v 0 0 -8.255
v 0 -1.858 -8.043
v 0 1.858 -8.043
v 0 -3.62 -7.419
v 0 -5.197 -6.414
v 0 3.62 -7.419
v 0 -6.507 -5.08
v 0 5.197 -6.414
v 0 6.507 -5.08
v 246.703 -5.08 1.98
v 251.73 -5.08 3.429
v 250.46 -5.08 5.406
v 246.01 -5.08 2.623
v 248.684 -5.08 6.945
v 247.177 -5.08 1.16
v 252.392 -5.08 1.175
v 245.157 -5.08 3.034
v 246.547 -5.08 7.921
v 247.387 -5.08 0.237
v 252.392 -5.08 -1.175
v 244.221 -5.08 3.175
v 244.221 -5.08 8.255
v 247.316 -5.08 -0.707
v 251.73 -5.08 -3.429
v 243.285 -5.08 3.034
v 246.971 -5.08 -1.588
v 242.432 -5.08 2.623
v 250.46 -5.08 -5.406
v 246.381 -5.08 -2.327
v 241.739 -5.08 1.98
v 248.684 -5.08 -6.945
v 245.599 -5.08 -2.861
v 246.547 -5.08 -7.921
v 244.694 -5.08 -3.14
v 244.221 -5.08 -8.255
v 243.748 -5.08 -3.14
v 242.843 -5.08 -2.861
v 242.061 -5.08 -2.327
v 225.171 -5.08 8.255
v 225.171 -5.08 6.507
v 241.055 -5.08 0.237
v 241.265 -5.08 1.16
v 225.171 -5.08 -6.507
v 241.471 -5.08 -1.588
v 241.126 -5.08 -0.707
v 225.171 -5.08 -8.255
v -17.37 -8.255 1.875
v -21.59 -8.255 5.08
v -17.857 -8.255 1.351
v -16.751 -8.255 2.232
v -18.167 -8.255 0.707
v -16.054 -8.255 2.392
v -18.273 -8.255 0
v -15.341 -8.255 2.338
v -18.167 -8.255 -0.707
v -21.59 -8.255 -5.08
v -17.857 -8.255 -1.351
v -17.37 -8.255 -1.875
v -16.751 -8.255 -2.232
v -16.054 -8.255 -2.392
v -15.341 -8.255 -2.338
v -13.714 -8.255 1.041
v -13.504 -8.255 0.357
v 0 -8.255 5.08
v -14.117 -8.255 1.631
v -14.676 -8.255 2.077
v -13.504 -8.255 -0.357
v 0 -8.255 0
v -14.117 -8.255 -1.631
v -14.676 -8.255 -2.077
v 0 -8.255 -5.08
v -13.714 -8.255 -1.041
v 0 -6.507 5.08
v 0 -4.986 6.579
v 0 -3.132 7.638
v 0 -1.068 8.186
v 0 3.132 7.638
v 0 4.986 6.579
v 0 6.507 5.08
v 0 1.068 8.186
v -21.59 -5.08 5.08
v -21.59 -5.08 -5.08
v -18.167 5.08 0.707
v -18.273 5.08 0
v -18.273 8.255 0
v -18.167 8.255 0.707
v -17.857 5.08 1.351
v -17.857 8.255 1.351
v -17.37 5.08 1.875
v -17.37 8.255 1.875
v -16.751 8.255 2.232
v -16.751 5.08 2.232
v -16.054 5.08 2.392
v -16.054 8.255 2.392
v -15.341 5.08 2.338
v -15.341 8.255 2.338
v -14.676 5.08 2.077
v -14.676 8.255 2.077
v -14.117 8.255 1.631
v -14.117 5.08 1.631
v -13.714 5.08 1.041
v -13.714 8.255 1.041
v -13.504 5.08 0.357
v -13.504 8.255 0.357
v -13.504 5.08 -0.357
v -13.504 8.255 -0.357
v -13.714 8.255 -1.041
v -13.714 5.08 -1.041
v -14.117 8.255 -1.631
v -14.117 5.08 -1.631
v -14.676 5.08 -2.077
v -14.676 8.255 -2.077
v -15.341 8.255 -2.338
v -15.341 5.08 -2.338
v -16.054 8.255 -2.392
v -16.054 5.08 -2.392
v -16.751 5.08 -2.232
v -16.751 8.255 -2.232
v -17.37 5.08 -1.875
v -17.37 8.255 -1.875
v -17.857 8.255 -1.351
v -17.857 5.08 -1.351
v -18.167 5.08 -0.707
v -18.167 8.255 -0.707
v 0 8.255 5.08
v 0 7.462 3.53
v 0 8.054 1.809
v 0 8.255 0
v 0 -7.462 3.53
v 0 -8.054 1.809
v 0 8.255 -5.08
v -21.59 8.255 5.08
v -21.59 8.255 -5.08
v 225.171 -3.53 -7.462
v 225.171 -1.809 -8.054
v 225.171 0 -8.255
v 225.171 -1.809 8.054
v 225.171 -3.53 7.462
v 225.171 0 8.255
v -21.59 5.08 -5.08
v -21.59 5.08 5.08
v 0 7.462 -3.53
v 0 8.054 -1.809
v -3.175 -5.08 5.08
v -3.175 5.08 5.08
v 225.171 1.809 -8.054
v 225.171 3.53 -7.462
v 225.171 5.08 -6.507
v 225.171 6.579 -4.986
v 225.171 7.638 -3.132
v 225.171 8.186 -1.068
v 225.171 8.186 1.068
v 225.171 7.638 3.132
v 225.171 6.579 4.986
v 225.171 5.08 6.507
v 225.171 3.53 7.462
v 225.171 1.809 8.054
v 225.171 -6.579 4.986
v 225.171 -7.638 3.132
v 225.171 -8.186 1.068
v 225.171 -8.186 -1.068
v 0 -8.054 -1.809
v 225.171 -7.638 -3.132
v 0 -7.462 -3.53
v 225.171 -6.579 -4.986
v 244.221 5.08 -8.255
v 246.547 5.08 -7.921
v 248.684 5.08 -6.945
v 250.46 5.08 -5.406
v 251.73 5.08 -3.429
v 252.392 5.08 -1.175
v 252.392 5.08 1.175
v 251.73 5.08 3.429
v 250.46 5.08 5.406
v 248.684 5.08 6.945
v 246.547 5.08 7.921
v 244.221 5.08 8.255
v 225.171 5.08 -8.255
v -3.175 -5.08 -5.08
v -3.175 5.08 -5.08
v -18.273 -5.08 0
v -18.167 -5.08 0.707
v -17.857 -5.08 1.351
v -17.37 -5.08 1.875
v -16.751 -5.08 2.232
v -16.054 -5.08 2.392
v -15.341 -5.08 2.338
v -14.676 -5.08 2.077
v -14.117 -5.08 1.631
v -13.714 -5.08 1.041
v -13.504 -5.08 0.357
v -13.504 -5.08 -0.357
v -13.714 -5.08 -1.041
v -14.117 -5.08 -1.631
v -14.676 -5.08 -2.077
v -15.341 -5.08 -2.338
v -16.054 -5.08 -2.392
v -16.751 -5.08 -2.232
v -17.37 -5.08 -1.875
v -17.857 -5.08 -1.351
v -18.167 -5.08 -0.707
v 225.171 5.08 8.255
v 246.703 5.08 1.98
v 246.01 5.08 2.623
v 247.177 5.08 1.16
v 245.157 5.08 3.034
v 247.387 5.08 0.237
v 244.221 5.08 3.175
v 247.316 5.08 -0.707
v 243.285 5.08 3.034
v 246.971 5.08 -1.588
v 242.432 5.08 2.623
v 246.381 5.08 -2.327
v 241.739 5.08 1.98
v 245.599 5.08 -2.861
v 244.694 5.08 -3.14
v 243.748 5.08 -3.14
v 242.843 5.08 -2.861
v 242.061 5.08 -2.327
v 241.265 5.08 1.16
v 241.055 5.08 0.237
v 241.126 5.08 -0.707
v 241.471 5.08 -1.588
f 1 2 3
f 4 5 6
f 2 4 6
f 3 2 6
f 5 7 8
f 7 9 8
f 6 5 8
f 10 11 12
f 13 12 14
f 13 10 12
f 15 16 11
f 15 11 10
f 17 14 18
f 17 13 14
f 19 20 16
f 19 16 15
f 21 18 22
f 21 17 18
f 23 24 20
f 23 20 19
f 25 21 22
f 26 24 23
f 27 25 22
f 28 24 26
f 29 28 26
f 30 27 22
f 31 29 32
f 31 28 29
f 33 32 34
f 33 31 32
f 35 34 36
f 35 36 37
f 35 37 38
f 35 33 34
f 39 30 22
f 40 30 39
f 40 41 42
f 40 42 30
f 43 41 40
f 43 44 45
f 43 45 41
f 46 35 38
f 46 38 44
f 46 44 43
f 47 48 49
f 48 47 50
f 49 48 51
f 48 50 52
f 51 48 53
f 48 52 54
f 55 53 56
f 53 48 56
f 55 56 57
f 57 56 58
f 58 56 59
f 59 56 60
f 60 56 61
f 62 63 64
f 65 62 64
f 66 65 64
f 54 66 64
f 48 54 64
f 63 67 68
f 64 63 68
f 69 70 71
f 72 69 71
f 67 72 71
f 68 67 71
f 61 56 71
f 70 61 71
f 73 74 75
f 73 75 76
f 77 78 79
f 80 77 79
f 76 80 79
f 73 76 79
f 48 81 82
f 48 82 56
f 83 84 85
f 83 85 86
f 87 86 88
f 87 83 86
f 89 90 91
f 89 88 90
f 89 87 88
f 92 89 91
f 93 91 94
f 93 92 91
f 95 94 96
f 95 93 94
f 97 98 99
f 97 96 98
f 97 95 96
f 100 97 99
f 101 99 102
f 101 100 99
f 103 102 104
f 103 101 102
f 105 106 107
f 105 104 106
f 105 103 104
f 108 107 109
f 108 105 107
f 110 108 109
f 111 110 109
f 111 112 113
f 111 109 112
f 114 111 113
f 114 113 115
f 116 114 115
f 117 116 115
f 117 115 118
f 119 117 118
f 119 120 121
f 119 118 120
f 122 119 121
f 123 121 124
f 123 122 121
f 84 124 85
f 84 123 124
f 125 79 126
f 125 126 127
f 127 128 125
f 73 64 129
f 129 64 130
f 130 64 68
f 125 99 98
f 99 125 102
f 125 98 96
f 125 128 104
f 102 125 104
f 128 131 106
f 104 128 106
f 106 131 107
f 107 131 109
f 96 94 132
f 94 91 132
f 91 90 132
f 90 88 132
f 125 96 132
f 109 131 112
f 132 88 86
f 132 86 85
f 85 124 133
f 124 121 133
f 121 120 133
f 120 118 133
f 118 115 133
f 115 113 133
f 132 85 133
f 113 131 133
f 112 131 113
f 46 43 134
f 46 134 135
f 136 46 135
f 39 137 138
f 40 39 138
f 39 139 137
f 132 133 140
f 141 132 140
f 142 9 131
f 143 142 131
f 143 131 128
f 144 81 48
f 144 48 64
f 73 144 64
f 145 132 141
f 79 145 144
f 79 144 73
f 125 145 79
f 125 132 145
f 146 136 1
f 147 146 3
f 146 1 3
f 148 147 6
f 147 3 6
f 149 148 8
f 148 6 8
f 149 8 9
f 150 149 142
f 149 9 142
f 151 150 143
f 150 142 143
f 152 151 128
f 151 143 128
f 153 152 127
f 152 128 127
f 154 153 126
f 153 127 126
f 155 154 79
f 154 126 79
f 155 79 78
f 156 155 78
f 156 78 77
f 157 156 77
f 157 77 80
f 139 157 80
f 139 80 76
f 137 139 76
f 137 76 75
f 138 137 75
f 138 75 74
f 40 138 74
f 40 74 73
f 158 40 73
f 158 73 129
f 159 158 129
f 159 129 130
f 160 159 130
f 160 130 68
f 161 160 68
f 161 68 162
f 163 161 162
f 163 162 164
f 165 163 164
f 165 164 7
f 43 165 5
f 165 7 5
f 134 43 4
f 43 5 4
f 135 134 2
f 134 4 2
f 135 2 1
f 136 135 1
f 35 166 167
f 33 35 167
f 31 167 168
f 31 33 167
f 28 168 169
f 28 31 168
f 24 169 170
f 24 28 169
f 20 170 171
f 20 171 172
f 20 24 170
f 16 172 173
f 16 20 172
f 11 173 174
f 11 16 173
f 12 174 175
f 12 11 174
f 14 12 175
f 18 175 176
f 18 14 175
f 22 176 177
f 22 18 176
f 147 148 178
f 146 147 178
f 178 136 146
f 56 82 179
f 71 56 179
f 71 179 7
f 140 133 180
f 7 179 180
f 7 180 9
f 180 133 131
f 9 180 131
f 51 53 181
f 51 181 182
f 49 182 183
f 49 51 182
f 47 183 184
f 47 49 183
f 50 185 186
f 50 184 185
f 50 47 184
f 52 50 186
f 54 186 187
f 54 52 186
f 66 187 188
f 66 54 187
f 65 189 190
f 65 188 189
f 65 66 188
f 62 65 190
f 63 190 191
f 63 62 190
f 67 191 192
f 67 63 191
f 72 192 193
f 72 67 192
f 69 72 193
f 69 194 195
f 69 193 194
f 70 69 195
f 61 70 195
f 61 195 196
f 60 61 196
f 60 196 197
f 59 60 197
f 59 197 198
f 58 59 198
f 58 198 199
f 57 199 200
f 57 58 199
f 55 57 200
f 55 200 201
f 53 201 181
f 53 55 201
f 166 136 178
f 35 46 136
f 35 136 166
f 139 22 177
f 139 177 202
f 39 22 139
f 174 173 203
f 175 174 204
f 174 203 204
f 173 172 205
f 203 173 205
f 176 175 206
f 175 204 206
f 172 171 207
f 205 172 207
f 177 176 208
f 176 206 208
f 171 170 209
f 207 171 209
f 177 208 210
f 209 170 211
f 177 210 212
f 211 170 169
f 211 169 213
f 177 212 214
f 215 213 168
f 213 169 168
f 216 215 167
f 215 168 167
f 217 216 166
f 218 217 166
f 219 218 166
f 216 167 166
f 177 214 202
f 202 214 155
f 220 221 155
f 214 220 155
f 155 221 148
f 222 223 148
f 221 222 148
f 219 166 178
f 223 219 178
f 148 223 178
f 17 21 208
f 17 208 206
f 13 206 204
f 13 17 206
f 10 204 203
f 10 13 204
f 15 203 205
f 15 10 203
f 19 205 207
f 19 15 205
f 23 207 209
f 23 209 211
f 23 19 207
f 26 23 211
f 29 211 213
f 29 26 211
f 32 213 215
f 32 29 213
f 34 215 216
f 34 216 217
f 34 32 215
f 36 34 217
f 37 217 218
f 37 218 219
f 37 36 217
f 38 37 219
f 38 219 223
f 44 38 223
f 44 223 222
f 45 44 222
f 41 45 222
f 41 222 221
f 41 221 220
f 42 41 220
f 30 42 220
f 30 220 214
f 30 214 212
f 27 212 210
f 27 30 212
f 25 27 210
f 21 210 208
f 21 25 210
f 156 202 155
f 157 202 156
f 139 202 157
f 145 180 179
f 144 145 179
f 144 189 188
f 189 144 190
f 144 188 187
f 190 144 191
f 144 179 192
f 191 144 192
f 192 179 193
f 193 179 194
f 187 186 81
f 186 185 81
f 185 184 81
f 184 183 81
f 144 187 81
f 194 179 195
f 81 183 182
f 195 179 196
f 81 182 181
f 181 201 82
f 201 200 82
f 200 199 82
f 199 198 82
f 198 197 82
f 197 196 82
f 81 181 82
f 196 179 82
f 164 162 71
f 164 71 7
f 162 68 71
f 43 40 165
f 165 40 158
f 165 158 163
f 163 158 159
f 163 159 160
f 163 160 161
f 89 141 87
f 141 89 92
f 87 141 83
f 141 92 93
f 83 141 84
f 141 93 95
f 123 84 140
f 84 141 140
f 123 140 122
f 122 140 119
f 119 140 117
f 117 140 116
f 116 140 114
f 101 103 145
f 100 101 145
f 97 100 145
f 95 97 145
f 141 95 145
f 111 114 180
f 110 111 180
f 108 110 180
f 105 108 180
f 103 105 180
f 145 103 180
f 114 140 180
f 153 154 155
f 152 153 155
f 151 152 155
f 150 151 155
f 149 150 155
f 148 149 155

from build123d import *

# Parameters (mm, degrees)
SKETCH1_R                = 8.255
BOSS_EXTRUDE1_DEPTH      = 225.171
BOSS_EXTRUDE2_DEPTH      = 5.08
BOSS_EXTRUDE2_DEPTH_BACK = 5.08
SKETCH2_R                = 3.175
BOSS_EXTRUDE3_DEPTH      = 5.08
BOSS_EXTRUDE3_DEPTH_BACK = 5.08
CUT_EXTRUDE1_DEPTH       = 253.962641167
CUT_EXTRUDE1_DEPTH_BACK  = 253.962641167
SKETCH4_R                = 2.398254968


with BuildPart() as part:
    # Sketch1 → Boss-Extrude1 (new body)
    with BuildSketch(Plane(origin=(0, 0, 0), x_dir=(0, 0, -1), z_dir=(1, 0, 0))):
        Circle(SKETCH1_R)
    extrude(amount=BOSS_EXTRUDE1_DEPTH)

    # Sketch2 → Boss-Extrude2 (add, two sides: drawn at the far end of the back side and taken through both)
    with BuildSketch(Plane(origin=(0, 0, 0), x_dir=(1, 0, 0), z_dir=(0, 1, 0)).offset(-BOSS_EXTRUDE2_DEPTH_BACK)):
        with BuildLine():
            Line((225.171, -8.255), (225.171, 8.255))
            Line((225.171, 8.255), (244.221, 8.255))
            ThreePointArc((244.221, 8.255), (252.476, 0), (244.221, -8.255))
            Line((244.221, -8.255), (225.171, -8.255))
        make_face()
        with Locations(Location((244.221, 0, 0), (0, 0, 270))):
            Circle(SKETCH2_R, mode=Mode.SUBTRACT)
    extrude(amount=BOSS_EXTRUDE2_DEPTH + BOSS_EXTRUDE2_DEPTH_BACK)

    # Sketch3 → Boss-Extrude3 (add, two sides: drawn at the far end of the back side and taken through both)
    with BuildSketch(Plane.XY.offset(-BOSS_EXTRUDE3_DEPTH_BACK)):
        Polygon((0, -8.255), (0, 8.255), (-21.59, 8.255), (-21.59, 5.08), (-3.175, 5.08), (-3.175, -5.08), (-21.59, -5.08), (-21.59, -8.255), align=None)
    extrude(amount=BOSS_EXTRUDE3_DEPTH + BOSS_EXTRUDE3_DEPTH_BACK)

    # Sketch4 → Cut-Extrude1 (cut, two sides: drawn at the far end of the back side and taken through both)
    with BuildSketch(Plane(origin=(0, -5.08, 0), x_dir=(1, 0, 0), z_dir=(0, 1, 0)).offset(-CUT_EXTRUDE1_DEPTH_BACK)):
        with Locations(Location((-15.875, 0, 0), (0, 0, 180))):
            Circle(SKETCH4_R)
    extrude(amount=CUT_EXTRUDE1_DEPTH + CUT_EXTRUDE1_DEPTH_BACK, mode=Mode.SUBTRACT)


solid = part.part
